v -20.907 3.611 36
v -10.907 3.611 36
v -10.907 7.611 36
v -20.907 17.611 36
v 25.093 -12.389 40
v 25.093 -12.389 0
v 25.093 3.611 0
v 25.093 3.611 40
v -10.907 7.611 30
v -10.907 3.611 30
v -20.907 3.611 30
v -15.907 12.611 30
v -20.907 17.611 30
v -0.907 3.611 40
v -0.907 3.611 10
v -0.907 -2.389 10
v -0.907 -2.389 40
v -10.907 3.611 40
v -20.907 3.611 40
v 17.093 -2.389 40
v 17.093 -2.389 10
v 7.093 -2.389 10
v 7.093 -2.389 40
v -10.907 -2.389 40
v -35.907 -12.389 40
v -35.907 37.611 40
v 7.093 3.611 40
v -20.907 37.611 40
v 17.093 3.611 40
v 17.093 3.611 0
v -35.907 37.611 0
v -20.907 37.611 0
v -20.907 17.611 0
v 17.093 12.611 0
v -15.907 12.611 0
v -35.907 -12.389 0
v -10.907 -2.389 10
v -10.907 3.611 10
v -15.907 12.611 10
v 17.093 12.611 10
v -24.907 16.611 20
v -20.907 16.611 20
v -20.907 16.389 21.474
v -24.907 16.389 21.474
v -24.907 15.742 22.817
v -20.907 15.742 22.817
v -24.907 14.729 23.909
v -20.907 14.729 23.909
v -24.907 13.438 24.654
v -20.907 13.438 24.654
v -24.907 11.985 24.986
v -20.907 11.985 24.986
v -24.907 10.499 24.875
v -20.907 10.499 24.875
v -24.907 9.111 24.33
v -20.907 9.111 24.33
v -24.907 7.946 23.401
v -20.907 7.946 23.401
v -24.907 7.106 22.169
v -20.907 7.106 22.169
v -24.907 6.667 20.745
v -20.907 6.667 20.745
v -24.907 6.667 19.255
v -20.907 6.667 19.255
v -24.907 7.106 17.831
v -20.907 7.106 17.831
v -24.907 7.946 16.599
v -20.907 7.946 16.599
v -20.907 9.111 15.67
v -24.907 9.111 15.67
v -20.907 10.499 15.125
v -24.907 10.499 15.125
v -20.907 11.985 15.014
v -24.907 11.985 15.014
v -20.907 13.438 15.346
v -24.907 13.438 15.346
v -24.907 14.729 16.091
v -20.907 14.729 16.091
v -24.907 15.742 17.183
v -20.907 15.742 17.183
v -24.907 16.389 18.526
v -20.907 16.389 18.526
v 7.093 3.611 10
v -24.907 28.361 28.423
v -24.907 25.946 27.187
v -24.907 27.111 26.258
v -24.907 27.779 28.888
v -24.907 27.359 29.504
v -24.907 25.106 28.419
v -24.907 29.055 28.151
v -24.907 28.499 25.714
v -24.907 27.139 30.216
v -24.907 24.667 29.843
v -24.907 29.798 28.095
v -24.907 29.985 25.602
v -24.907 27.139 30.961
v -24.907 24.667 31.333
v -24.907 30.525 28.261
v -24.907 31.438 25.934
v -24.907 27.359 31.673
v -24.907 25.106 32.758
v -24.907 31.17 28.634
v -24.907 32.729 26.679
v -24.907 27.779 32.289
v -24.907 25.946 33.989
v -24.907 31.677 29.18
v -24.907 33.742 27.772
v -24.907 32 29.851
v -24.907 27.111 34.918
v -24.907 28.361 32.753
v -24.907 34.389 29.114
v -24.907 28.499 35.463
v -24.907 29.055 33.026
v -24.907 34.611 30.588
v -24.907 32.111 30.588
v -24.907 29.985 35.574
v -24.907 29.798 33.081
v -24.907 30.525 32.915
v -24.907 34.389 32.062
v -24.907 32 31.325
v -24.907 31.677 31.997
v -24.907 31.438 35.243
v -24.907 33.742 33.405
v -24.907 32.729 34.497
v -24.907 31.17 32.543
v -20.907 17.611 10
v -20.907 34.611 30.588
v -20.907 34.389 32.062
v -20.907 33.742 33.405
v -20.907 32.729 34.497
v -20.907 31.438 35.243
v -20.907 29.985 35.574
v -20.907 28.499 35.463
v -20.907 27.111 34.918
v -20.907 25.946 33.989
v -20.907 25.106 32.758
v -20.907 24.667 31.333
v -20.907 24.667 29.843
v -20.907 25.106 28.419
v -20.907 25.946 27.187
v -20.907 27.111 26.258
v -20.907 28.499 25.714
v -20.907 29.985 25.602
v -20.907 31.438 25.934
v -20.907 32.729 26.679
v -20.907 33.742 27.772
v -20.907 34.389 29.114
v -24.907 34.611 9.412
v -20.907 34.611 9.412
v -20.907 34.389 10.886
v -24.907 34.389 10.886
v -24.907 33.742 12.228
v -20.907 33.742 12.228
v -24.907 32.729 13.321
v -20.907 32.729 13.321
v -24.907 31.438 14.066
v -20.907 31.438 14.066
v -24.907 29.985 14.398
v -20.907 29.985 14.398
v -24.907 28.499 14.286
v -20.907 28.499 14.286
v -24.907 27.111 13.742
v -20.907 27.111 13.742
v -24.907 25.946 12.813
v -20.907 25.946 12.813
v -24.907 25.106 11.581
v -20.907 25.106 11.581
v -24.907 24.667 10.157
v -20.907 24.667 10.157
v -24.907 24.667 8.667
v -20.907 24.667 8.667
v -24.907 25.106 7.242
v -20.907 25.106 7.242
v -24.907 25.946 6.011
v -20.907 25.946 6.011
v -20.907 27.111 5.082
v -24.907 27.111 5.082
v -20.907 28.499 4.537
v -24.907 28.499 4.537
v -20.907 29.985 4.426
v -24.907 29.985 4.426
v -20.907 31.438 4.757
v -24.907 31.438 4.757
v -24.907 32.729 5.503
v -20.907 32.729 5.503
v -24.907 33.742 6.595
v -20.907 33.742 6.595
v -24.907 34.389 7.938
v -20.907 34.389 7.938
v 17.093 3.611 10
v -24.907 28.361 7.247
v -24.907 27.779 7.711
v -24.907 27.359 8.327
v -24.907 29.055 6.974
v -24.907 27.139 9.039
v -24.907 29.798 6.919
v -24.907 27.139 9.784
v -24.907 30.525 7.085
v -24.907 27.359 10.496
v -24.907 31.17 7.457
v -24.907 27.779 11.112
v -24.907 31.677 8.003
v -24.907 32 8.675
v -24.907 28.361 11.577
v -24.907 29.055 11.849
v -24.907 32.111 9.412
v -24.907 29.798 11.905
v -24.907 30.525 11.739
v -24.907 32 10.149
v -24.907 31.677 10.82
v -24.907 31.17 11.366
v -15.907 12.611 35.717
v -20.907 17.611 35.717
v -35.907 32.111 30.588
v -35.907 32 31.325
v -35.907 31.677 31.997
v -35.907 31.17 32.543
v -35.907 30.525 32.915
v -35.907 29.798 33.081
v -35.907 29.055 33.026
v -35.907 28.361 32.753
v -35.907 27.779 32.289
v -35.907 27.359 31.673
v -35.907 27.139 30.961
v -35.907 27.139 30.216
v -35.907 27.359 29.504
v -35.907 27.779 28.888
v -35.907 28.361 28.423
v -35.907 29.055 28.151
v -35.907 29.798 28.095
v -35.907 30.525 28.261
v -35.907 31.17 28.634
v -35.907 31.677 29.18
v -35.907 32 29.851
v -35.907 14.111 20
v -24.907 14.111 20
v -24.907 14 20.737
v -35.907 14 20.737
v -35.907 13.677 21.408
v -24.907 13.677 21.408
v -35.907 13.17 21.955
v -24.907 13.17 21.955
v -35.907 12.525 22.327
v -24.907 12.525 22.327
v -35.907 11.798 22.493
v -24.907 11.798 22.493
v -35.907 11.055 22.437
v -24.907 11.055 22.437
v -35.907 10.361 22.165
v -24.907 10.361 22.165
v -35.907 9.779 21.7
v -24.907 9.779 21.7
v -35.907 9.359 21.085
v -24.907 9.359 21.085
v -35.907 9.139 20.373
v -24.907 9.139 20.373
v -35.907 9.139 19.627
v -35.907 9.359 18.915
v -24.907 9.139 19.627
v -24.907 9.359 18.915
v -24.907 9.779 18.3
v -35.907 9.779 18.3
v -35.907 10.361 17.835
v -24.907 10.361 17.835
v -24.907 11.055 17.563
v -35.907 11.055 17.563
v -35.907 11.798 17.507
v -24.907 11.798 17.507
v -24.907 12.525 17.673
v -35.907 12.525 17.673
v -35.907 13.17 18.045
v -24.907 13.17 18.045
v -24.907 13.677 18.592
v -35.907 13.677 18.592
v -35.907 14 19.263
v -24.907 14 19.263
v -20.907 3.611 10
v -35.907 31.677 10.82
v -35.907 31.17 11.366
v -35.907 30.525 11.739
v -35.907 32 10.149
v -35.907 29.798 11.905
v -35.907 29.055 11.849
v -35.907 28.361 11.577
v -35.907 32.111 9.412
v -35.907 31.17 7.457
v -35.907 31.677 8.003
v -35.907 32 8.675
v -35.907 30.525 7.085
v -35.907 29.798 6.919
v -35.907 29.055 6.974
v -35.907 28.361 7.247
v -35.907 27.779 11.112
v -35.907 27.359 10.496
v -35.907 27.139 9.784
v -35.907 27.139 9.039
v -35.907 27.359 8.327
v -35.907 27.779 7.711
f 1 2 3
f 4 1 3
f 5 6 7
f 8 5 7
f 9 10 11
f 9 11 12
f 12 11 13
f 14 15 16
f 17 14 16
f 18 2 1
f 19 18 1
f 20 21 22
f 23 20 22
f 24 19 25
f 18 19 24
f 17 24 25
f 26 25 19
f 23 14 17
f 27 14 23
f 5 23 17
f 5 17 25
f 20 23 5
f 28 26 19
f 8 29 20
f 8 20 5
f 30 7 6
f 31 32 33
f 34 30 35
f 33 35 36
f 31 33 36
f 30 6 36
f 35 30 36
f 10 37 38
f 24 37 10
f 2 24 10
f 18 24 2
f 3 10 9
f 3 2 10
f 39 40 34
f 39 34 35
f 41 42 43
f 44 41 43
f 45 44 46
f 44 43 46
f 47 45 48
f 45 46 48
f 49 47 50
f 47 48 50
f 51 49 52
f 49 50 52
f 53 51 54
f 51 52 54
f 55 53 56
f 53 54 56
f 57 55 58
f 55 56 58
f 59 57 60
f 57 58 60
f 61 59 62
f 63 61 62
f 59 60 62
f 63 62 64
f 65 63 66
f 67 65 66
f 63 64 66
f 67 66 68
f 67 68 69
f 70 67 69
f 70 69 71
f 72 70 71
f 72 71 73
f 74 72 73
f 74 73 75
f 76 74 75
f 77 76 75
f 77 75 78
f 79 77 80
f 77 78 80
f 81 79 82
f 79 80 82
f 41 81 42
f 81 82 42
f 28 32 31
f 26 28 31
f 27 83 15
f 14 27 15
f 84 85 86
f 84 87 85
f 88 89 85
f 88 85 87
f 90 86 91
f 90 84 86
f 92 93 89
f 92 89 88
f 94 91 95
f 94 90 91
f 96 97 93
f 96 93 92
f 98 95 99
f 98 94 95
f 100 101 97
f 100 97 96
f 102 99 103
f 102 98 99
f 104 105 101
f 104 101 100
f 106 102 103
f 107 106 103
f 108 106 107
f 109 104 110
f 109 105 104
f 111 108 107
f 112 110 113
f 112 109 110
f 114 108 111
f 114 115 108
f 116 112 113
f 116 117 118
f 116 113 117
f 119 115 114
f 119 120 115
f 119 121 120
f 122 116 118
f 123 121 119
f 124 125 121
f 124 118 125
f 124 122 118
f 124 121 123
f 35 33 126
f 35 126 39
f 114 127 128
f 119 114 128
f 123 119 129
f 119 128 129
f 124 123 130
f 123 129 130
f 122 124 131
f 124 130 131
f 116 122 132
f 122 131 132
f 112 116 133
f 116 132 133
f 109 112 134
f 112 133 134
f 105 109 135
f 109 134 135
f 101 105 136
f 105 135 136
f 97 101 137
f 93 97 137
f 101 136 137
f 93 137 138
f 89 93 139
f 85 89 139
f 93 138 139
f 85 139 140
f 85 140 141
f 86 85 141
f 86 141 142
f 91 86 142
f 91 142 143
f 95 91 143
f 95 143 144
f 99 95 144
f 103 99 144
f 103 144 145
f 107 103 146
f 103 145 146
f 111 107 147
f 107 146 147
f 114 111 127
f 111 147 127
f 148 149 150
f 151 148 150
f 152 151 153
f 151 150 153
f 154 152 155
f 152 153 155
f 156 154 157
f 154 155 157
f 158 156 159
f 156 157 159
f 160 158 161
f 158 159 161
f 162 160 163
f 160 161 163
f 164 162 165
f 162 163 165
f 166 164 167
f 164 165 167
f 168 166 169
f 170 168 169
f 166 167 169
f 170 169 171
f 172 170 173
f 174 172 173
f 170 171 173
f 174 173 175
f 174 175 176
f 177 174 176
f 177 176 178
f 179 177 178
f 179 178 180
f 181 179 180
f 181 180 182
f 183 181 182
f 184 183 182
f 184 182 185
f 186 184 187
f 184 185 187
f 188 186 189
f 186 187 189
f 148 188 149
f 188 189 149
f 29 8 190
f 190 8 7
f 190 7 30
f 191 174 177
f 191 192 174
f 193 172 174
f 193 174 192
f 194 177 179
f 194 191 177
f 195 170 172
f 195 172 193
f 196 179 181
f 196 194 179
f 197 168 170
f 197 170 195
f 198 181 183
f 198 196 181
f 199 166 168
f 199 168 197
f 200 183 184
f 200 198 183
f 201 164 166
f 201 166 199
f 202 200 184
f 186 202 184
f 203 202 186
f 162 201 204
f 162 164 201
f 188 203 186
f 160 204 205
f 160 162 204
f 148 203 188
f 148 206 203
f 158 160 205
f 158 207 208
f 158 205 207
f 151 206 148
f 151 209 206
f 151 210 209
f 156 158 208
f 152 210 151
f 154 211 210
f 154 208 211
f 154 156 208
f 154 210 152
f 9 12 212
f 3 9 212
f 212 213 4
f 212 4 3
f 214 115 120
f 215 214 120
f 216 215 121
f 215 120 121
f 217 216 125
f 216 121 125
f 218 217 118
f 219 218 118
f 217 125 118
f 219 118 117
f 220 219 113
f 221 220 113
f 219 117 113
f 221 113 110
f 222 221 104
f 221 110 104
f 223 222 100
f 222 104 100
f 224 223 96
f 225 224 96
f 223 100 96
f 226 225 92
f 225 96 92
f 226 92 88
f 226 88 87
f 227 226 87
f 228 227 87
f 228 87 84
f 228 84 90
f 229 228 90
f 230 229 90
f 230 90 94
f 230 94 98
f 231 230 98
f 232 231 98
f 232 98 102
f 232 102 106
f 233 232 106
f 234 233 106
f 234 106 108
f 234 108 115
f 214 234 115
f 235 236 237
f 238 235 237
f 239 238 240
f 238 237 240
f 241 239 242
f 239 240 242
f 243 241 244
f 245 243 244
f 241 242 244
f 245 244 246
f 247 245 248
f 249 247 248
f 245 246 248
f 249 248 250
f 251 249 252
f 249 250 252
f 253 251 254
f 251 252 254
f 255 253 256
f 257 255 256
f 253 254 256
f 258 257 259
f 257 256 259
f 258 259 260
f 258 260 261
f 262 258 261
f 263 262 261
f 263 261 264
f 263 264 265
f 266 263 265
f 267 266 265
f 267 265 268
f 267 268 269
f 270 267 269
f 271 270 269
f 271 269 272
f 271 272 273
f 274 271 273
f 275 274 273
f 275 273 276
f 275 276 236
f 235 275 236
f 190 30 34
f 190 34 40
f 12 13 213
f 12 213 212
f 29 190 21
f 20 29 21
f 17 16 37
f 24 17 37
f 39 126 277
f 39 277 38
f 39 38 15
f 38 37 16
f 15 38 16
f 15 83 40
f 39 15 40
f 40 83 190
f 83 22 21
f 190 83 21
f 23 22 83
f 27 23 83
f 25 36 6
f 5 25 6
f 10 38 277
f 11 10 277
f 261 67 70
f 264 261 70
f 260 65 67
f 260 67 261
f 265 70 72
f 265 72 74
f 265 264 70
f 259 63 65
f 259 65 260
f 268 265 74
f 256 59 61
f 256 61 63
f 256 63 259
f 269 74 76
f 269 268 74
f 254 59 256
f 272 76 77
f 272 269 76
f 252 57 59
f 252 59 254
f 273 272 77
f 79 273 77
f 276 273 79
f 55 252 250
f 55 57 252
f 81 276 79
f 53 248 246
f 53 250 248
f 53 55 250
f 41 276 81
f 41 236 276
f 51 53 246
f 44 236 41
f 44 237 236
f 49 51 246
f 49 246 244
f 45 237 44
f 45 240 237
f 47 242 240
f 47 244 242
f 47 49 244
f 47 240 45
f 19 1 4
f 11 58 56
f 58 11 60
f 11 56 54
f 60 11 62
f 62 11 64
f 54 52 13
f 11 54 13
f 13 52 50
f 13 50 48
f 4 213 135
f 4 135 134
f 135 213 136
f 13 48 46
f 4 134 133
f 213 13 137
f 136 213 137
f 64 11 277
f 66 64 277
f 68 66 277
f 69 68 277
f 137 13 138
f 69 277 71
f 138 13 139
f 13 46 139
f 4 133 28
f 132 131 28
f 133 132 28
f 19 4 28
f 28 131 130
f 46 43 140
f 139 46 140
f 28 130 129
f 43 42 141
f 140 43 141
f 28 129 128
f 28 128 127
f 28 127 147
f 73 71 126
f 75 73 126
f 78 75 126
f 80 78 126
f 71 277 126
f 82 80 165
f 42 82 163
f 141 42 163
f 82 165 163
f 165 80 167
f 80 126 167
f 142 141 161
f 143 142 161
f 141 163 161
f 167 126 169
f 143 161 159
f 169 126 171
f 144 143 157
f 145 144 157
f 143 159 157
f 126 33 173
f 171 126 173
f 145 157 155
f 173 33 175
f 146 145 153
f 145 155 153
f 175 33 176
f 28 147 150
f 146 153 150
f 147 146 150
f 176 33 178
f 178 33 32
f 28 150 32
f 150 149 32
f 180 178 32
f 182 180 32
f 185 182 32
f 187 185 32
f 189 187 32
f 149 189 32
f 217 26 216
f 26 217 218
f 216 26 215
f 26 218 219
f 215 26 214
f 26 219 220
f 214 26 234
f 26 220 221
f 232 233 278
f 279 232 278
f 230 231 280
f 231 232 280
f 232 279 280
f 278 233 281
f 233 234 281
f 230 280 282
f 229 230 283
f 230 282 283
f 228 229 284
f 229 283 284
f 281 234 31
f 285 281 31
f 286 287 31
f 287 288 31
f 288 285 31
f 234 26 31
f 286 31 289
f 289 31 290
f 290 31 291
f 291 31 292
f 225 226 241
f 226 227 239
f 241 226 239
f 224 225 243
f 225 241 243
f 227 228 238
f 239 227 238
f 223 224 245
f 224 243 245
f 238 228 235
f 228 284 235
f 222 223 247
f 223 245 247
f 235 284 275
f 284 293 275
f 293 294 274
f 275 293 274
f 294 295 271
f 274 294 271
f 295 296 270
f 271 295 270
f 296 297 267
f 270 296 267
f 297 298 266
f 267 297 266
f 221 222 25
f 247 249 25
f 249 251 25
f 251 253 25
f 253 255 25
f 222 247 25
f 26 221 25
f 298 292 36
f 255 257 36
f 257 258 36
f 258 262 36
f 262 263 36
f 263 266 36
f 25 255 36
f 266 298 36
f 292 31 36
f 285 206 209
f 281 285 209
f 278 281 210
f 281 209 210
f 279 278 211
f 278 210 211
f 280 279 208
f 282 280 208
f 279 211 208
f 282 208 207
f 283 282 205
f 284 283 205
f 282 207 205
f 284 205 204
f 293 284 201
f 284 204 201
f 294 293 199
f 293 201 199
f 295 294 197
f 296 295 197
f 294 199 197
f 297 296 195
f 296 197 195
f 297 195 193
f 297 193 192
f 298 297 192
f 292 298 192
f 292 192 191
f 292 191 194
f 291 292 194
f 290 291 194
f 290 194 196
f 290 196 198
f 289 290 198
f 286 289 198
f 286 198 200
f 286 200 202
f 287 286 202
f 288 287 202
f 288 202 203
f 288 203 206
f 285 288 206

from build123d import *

# Parameters (mm, degrees)
F1_DEPTH     = 40
F2_R         = 5
F2_R_2       = 2.5
F3_DEPTH     = 4
F4_DEPTH     = 15.001
F2_W         = 14
F2_H         = 6
F5_DEPTH     = 10
F2_H_2       = 10
F6_DEPTH     = 10
F7_SIZE      = 9.99999
F8_W         = 10
F8_H         = 10
F8_W_2       = 8
F9_DEPTH     = 15
F10_T4_DEPTH = 61.4336597593


# Not quite as in the source:
# - a fillet or chamfer that OpenCascade refuses, or shapes differently, is made with other operations: its cross-section is extruded or revolved along the edge and cut away or added
# - a fillet or chamfer is up to 0.001 mm smaller than in the source, because OpenCascade refuses the exact size
# - a feature names something its author has since deleted; it is built from what else it names


with BuildPart() as f1:
    # F0 (on Top) → F1 (new body)
    with BuildSketch(Plane.XY):
        Polygon((-20.9070546148, 3.6112386312), (-20.9070546148, 37.6112386312), (-35.9070546148, 37.6112386312), (-35.9070546148, -12.3887613688), (25.0929453852, -12.3887613688), (25.0929453852, 3.6112386312), (17.0929453852, 3.6112386312), (17.0929453852, -2.3887613688), (7.0929453852, -2.3887613688), (7.0929453852, 3.6112386312), (-0.9070546148, 3.6112386312), (-0.9070546148, -2.3887613688), (-10.9070546148, -2.3887613688), (-10.9070546148, 3.6112386312), align=None)
    extrude(amount=F1_DEPTH)

    # F2 (on face) → F3 (cut)
    with BuildSketch(Plane.YZ.offset(-20.9070546148)):
        with Locations((29.6112386312, 9.4117647059)):
            Circle(F2_R)
        with Locations((29.6112386312, 9.4117647059)):
            Circle(F2_R_2, mode=Mode.SUBTRACT)
        with Locations((11.6112386312, 20)):
            Circle(F2_R)
        with Locations((11.6112386312, 20)):
            Circle(F2_R_2, mode=Mode.SUBTRACT)
        with Locations((29.6112386312, 30.5882352941)):
            Circle(F2_R)
        with Locations((29.6112386312, 30.5882352941)):
            Circle(F2_R_2, mode=Mode.SUBTRACT)
    extrude(amount=-F3_DEPTH, mode=Mode.SUBTRACT)

    # F4 (cut, through all): faces of the model
    f4_faces = [f1.faces().sort_by_distance(p)[0] for p in [
        (-20.9070546148, 29.6112386312, 9.4117647059),
        (-20.9070546148, 11.6112386312, 20),
        (-20.9070546148, 29.6112386312, 30.5882352941),
    ]]
    extrude(f4_faces, amount=-F4_DEPTH, mode=Mode.SUBTRACT)

    # F2 (on face) → F5 (join)
    with BuildSketch(Plane.YZ.offset(-20.9070546148)):
        with Locations((10.6112386312, 33)):
            Rectangle(F2_W, F2_H)
    extrude(amount=F5_DEPTH)

    # F2 (on face) → F6 (join)
    with BuildSketch(Plane.YZ.offset(-20.9070546148)):
        with Locations((10.6112386312, 5)):
            Rectangle(F2_W, F2_H_2)
    extrude(amount=F6_DEPTH)

    # F7 (size 10 in the source; OpenCascade refuses exactly that, so slightly less here)
    f7_edges = [f1.edges().sort_by_distance(p)[0] for p in [
        (-10.907055, 17.611239, 33),
    ]]
    chamfer(f7_edges, length=F7_SIZE)

    # F8 (on face) → F9 (join)
    with BuildSketch(Plane(origin=(0, -2.3887613688, 0), x_dir=(-1, 0, 0), z_dir=(0, 1, 0))):
        with Locations((-12.0929453852, 5)):
            Rectangle(F8_W, F8_H)
        with Locations((5.9070546148, 5)):
            Rectangle(F8_W, F8_H)
        with Locations((-3.0929453852, 5)):
            Rectangle(F8_W_2, F8_H)
    extrude(amount=F9_DEPTH)

    # F10: chamfer of 10 on 1 edges, made by hand


with BuildPart() as f10_tool2:
    # F10_s3 → F10_t4 (new body)
    with BuildSketch(Plane.XY.offset(-25.7168298797)):
        Polygon((-20.9070546148, 17.6112386312), (-10.9070546148, 7.6112386312), (-10.9070546148, 17.6112386312), align=None)
    extrude(amount=F10_T4_DEPTH)

    split(bisect_by=Plane.YZ.offset(-20.9070546148), keep=Keep.TOP)

    split(bisect_by=Plane.XZ.offset(-12.6112386312), keep=Keep.BOTTOM)


with BuildPart() as f1_1:
    add(f1.part)

    # F10_t1: cut F10_tool2
    add(f10_tool2.part, mode=Mode.SUBTRACT)


solid = f1_1.part
